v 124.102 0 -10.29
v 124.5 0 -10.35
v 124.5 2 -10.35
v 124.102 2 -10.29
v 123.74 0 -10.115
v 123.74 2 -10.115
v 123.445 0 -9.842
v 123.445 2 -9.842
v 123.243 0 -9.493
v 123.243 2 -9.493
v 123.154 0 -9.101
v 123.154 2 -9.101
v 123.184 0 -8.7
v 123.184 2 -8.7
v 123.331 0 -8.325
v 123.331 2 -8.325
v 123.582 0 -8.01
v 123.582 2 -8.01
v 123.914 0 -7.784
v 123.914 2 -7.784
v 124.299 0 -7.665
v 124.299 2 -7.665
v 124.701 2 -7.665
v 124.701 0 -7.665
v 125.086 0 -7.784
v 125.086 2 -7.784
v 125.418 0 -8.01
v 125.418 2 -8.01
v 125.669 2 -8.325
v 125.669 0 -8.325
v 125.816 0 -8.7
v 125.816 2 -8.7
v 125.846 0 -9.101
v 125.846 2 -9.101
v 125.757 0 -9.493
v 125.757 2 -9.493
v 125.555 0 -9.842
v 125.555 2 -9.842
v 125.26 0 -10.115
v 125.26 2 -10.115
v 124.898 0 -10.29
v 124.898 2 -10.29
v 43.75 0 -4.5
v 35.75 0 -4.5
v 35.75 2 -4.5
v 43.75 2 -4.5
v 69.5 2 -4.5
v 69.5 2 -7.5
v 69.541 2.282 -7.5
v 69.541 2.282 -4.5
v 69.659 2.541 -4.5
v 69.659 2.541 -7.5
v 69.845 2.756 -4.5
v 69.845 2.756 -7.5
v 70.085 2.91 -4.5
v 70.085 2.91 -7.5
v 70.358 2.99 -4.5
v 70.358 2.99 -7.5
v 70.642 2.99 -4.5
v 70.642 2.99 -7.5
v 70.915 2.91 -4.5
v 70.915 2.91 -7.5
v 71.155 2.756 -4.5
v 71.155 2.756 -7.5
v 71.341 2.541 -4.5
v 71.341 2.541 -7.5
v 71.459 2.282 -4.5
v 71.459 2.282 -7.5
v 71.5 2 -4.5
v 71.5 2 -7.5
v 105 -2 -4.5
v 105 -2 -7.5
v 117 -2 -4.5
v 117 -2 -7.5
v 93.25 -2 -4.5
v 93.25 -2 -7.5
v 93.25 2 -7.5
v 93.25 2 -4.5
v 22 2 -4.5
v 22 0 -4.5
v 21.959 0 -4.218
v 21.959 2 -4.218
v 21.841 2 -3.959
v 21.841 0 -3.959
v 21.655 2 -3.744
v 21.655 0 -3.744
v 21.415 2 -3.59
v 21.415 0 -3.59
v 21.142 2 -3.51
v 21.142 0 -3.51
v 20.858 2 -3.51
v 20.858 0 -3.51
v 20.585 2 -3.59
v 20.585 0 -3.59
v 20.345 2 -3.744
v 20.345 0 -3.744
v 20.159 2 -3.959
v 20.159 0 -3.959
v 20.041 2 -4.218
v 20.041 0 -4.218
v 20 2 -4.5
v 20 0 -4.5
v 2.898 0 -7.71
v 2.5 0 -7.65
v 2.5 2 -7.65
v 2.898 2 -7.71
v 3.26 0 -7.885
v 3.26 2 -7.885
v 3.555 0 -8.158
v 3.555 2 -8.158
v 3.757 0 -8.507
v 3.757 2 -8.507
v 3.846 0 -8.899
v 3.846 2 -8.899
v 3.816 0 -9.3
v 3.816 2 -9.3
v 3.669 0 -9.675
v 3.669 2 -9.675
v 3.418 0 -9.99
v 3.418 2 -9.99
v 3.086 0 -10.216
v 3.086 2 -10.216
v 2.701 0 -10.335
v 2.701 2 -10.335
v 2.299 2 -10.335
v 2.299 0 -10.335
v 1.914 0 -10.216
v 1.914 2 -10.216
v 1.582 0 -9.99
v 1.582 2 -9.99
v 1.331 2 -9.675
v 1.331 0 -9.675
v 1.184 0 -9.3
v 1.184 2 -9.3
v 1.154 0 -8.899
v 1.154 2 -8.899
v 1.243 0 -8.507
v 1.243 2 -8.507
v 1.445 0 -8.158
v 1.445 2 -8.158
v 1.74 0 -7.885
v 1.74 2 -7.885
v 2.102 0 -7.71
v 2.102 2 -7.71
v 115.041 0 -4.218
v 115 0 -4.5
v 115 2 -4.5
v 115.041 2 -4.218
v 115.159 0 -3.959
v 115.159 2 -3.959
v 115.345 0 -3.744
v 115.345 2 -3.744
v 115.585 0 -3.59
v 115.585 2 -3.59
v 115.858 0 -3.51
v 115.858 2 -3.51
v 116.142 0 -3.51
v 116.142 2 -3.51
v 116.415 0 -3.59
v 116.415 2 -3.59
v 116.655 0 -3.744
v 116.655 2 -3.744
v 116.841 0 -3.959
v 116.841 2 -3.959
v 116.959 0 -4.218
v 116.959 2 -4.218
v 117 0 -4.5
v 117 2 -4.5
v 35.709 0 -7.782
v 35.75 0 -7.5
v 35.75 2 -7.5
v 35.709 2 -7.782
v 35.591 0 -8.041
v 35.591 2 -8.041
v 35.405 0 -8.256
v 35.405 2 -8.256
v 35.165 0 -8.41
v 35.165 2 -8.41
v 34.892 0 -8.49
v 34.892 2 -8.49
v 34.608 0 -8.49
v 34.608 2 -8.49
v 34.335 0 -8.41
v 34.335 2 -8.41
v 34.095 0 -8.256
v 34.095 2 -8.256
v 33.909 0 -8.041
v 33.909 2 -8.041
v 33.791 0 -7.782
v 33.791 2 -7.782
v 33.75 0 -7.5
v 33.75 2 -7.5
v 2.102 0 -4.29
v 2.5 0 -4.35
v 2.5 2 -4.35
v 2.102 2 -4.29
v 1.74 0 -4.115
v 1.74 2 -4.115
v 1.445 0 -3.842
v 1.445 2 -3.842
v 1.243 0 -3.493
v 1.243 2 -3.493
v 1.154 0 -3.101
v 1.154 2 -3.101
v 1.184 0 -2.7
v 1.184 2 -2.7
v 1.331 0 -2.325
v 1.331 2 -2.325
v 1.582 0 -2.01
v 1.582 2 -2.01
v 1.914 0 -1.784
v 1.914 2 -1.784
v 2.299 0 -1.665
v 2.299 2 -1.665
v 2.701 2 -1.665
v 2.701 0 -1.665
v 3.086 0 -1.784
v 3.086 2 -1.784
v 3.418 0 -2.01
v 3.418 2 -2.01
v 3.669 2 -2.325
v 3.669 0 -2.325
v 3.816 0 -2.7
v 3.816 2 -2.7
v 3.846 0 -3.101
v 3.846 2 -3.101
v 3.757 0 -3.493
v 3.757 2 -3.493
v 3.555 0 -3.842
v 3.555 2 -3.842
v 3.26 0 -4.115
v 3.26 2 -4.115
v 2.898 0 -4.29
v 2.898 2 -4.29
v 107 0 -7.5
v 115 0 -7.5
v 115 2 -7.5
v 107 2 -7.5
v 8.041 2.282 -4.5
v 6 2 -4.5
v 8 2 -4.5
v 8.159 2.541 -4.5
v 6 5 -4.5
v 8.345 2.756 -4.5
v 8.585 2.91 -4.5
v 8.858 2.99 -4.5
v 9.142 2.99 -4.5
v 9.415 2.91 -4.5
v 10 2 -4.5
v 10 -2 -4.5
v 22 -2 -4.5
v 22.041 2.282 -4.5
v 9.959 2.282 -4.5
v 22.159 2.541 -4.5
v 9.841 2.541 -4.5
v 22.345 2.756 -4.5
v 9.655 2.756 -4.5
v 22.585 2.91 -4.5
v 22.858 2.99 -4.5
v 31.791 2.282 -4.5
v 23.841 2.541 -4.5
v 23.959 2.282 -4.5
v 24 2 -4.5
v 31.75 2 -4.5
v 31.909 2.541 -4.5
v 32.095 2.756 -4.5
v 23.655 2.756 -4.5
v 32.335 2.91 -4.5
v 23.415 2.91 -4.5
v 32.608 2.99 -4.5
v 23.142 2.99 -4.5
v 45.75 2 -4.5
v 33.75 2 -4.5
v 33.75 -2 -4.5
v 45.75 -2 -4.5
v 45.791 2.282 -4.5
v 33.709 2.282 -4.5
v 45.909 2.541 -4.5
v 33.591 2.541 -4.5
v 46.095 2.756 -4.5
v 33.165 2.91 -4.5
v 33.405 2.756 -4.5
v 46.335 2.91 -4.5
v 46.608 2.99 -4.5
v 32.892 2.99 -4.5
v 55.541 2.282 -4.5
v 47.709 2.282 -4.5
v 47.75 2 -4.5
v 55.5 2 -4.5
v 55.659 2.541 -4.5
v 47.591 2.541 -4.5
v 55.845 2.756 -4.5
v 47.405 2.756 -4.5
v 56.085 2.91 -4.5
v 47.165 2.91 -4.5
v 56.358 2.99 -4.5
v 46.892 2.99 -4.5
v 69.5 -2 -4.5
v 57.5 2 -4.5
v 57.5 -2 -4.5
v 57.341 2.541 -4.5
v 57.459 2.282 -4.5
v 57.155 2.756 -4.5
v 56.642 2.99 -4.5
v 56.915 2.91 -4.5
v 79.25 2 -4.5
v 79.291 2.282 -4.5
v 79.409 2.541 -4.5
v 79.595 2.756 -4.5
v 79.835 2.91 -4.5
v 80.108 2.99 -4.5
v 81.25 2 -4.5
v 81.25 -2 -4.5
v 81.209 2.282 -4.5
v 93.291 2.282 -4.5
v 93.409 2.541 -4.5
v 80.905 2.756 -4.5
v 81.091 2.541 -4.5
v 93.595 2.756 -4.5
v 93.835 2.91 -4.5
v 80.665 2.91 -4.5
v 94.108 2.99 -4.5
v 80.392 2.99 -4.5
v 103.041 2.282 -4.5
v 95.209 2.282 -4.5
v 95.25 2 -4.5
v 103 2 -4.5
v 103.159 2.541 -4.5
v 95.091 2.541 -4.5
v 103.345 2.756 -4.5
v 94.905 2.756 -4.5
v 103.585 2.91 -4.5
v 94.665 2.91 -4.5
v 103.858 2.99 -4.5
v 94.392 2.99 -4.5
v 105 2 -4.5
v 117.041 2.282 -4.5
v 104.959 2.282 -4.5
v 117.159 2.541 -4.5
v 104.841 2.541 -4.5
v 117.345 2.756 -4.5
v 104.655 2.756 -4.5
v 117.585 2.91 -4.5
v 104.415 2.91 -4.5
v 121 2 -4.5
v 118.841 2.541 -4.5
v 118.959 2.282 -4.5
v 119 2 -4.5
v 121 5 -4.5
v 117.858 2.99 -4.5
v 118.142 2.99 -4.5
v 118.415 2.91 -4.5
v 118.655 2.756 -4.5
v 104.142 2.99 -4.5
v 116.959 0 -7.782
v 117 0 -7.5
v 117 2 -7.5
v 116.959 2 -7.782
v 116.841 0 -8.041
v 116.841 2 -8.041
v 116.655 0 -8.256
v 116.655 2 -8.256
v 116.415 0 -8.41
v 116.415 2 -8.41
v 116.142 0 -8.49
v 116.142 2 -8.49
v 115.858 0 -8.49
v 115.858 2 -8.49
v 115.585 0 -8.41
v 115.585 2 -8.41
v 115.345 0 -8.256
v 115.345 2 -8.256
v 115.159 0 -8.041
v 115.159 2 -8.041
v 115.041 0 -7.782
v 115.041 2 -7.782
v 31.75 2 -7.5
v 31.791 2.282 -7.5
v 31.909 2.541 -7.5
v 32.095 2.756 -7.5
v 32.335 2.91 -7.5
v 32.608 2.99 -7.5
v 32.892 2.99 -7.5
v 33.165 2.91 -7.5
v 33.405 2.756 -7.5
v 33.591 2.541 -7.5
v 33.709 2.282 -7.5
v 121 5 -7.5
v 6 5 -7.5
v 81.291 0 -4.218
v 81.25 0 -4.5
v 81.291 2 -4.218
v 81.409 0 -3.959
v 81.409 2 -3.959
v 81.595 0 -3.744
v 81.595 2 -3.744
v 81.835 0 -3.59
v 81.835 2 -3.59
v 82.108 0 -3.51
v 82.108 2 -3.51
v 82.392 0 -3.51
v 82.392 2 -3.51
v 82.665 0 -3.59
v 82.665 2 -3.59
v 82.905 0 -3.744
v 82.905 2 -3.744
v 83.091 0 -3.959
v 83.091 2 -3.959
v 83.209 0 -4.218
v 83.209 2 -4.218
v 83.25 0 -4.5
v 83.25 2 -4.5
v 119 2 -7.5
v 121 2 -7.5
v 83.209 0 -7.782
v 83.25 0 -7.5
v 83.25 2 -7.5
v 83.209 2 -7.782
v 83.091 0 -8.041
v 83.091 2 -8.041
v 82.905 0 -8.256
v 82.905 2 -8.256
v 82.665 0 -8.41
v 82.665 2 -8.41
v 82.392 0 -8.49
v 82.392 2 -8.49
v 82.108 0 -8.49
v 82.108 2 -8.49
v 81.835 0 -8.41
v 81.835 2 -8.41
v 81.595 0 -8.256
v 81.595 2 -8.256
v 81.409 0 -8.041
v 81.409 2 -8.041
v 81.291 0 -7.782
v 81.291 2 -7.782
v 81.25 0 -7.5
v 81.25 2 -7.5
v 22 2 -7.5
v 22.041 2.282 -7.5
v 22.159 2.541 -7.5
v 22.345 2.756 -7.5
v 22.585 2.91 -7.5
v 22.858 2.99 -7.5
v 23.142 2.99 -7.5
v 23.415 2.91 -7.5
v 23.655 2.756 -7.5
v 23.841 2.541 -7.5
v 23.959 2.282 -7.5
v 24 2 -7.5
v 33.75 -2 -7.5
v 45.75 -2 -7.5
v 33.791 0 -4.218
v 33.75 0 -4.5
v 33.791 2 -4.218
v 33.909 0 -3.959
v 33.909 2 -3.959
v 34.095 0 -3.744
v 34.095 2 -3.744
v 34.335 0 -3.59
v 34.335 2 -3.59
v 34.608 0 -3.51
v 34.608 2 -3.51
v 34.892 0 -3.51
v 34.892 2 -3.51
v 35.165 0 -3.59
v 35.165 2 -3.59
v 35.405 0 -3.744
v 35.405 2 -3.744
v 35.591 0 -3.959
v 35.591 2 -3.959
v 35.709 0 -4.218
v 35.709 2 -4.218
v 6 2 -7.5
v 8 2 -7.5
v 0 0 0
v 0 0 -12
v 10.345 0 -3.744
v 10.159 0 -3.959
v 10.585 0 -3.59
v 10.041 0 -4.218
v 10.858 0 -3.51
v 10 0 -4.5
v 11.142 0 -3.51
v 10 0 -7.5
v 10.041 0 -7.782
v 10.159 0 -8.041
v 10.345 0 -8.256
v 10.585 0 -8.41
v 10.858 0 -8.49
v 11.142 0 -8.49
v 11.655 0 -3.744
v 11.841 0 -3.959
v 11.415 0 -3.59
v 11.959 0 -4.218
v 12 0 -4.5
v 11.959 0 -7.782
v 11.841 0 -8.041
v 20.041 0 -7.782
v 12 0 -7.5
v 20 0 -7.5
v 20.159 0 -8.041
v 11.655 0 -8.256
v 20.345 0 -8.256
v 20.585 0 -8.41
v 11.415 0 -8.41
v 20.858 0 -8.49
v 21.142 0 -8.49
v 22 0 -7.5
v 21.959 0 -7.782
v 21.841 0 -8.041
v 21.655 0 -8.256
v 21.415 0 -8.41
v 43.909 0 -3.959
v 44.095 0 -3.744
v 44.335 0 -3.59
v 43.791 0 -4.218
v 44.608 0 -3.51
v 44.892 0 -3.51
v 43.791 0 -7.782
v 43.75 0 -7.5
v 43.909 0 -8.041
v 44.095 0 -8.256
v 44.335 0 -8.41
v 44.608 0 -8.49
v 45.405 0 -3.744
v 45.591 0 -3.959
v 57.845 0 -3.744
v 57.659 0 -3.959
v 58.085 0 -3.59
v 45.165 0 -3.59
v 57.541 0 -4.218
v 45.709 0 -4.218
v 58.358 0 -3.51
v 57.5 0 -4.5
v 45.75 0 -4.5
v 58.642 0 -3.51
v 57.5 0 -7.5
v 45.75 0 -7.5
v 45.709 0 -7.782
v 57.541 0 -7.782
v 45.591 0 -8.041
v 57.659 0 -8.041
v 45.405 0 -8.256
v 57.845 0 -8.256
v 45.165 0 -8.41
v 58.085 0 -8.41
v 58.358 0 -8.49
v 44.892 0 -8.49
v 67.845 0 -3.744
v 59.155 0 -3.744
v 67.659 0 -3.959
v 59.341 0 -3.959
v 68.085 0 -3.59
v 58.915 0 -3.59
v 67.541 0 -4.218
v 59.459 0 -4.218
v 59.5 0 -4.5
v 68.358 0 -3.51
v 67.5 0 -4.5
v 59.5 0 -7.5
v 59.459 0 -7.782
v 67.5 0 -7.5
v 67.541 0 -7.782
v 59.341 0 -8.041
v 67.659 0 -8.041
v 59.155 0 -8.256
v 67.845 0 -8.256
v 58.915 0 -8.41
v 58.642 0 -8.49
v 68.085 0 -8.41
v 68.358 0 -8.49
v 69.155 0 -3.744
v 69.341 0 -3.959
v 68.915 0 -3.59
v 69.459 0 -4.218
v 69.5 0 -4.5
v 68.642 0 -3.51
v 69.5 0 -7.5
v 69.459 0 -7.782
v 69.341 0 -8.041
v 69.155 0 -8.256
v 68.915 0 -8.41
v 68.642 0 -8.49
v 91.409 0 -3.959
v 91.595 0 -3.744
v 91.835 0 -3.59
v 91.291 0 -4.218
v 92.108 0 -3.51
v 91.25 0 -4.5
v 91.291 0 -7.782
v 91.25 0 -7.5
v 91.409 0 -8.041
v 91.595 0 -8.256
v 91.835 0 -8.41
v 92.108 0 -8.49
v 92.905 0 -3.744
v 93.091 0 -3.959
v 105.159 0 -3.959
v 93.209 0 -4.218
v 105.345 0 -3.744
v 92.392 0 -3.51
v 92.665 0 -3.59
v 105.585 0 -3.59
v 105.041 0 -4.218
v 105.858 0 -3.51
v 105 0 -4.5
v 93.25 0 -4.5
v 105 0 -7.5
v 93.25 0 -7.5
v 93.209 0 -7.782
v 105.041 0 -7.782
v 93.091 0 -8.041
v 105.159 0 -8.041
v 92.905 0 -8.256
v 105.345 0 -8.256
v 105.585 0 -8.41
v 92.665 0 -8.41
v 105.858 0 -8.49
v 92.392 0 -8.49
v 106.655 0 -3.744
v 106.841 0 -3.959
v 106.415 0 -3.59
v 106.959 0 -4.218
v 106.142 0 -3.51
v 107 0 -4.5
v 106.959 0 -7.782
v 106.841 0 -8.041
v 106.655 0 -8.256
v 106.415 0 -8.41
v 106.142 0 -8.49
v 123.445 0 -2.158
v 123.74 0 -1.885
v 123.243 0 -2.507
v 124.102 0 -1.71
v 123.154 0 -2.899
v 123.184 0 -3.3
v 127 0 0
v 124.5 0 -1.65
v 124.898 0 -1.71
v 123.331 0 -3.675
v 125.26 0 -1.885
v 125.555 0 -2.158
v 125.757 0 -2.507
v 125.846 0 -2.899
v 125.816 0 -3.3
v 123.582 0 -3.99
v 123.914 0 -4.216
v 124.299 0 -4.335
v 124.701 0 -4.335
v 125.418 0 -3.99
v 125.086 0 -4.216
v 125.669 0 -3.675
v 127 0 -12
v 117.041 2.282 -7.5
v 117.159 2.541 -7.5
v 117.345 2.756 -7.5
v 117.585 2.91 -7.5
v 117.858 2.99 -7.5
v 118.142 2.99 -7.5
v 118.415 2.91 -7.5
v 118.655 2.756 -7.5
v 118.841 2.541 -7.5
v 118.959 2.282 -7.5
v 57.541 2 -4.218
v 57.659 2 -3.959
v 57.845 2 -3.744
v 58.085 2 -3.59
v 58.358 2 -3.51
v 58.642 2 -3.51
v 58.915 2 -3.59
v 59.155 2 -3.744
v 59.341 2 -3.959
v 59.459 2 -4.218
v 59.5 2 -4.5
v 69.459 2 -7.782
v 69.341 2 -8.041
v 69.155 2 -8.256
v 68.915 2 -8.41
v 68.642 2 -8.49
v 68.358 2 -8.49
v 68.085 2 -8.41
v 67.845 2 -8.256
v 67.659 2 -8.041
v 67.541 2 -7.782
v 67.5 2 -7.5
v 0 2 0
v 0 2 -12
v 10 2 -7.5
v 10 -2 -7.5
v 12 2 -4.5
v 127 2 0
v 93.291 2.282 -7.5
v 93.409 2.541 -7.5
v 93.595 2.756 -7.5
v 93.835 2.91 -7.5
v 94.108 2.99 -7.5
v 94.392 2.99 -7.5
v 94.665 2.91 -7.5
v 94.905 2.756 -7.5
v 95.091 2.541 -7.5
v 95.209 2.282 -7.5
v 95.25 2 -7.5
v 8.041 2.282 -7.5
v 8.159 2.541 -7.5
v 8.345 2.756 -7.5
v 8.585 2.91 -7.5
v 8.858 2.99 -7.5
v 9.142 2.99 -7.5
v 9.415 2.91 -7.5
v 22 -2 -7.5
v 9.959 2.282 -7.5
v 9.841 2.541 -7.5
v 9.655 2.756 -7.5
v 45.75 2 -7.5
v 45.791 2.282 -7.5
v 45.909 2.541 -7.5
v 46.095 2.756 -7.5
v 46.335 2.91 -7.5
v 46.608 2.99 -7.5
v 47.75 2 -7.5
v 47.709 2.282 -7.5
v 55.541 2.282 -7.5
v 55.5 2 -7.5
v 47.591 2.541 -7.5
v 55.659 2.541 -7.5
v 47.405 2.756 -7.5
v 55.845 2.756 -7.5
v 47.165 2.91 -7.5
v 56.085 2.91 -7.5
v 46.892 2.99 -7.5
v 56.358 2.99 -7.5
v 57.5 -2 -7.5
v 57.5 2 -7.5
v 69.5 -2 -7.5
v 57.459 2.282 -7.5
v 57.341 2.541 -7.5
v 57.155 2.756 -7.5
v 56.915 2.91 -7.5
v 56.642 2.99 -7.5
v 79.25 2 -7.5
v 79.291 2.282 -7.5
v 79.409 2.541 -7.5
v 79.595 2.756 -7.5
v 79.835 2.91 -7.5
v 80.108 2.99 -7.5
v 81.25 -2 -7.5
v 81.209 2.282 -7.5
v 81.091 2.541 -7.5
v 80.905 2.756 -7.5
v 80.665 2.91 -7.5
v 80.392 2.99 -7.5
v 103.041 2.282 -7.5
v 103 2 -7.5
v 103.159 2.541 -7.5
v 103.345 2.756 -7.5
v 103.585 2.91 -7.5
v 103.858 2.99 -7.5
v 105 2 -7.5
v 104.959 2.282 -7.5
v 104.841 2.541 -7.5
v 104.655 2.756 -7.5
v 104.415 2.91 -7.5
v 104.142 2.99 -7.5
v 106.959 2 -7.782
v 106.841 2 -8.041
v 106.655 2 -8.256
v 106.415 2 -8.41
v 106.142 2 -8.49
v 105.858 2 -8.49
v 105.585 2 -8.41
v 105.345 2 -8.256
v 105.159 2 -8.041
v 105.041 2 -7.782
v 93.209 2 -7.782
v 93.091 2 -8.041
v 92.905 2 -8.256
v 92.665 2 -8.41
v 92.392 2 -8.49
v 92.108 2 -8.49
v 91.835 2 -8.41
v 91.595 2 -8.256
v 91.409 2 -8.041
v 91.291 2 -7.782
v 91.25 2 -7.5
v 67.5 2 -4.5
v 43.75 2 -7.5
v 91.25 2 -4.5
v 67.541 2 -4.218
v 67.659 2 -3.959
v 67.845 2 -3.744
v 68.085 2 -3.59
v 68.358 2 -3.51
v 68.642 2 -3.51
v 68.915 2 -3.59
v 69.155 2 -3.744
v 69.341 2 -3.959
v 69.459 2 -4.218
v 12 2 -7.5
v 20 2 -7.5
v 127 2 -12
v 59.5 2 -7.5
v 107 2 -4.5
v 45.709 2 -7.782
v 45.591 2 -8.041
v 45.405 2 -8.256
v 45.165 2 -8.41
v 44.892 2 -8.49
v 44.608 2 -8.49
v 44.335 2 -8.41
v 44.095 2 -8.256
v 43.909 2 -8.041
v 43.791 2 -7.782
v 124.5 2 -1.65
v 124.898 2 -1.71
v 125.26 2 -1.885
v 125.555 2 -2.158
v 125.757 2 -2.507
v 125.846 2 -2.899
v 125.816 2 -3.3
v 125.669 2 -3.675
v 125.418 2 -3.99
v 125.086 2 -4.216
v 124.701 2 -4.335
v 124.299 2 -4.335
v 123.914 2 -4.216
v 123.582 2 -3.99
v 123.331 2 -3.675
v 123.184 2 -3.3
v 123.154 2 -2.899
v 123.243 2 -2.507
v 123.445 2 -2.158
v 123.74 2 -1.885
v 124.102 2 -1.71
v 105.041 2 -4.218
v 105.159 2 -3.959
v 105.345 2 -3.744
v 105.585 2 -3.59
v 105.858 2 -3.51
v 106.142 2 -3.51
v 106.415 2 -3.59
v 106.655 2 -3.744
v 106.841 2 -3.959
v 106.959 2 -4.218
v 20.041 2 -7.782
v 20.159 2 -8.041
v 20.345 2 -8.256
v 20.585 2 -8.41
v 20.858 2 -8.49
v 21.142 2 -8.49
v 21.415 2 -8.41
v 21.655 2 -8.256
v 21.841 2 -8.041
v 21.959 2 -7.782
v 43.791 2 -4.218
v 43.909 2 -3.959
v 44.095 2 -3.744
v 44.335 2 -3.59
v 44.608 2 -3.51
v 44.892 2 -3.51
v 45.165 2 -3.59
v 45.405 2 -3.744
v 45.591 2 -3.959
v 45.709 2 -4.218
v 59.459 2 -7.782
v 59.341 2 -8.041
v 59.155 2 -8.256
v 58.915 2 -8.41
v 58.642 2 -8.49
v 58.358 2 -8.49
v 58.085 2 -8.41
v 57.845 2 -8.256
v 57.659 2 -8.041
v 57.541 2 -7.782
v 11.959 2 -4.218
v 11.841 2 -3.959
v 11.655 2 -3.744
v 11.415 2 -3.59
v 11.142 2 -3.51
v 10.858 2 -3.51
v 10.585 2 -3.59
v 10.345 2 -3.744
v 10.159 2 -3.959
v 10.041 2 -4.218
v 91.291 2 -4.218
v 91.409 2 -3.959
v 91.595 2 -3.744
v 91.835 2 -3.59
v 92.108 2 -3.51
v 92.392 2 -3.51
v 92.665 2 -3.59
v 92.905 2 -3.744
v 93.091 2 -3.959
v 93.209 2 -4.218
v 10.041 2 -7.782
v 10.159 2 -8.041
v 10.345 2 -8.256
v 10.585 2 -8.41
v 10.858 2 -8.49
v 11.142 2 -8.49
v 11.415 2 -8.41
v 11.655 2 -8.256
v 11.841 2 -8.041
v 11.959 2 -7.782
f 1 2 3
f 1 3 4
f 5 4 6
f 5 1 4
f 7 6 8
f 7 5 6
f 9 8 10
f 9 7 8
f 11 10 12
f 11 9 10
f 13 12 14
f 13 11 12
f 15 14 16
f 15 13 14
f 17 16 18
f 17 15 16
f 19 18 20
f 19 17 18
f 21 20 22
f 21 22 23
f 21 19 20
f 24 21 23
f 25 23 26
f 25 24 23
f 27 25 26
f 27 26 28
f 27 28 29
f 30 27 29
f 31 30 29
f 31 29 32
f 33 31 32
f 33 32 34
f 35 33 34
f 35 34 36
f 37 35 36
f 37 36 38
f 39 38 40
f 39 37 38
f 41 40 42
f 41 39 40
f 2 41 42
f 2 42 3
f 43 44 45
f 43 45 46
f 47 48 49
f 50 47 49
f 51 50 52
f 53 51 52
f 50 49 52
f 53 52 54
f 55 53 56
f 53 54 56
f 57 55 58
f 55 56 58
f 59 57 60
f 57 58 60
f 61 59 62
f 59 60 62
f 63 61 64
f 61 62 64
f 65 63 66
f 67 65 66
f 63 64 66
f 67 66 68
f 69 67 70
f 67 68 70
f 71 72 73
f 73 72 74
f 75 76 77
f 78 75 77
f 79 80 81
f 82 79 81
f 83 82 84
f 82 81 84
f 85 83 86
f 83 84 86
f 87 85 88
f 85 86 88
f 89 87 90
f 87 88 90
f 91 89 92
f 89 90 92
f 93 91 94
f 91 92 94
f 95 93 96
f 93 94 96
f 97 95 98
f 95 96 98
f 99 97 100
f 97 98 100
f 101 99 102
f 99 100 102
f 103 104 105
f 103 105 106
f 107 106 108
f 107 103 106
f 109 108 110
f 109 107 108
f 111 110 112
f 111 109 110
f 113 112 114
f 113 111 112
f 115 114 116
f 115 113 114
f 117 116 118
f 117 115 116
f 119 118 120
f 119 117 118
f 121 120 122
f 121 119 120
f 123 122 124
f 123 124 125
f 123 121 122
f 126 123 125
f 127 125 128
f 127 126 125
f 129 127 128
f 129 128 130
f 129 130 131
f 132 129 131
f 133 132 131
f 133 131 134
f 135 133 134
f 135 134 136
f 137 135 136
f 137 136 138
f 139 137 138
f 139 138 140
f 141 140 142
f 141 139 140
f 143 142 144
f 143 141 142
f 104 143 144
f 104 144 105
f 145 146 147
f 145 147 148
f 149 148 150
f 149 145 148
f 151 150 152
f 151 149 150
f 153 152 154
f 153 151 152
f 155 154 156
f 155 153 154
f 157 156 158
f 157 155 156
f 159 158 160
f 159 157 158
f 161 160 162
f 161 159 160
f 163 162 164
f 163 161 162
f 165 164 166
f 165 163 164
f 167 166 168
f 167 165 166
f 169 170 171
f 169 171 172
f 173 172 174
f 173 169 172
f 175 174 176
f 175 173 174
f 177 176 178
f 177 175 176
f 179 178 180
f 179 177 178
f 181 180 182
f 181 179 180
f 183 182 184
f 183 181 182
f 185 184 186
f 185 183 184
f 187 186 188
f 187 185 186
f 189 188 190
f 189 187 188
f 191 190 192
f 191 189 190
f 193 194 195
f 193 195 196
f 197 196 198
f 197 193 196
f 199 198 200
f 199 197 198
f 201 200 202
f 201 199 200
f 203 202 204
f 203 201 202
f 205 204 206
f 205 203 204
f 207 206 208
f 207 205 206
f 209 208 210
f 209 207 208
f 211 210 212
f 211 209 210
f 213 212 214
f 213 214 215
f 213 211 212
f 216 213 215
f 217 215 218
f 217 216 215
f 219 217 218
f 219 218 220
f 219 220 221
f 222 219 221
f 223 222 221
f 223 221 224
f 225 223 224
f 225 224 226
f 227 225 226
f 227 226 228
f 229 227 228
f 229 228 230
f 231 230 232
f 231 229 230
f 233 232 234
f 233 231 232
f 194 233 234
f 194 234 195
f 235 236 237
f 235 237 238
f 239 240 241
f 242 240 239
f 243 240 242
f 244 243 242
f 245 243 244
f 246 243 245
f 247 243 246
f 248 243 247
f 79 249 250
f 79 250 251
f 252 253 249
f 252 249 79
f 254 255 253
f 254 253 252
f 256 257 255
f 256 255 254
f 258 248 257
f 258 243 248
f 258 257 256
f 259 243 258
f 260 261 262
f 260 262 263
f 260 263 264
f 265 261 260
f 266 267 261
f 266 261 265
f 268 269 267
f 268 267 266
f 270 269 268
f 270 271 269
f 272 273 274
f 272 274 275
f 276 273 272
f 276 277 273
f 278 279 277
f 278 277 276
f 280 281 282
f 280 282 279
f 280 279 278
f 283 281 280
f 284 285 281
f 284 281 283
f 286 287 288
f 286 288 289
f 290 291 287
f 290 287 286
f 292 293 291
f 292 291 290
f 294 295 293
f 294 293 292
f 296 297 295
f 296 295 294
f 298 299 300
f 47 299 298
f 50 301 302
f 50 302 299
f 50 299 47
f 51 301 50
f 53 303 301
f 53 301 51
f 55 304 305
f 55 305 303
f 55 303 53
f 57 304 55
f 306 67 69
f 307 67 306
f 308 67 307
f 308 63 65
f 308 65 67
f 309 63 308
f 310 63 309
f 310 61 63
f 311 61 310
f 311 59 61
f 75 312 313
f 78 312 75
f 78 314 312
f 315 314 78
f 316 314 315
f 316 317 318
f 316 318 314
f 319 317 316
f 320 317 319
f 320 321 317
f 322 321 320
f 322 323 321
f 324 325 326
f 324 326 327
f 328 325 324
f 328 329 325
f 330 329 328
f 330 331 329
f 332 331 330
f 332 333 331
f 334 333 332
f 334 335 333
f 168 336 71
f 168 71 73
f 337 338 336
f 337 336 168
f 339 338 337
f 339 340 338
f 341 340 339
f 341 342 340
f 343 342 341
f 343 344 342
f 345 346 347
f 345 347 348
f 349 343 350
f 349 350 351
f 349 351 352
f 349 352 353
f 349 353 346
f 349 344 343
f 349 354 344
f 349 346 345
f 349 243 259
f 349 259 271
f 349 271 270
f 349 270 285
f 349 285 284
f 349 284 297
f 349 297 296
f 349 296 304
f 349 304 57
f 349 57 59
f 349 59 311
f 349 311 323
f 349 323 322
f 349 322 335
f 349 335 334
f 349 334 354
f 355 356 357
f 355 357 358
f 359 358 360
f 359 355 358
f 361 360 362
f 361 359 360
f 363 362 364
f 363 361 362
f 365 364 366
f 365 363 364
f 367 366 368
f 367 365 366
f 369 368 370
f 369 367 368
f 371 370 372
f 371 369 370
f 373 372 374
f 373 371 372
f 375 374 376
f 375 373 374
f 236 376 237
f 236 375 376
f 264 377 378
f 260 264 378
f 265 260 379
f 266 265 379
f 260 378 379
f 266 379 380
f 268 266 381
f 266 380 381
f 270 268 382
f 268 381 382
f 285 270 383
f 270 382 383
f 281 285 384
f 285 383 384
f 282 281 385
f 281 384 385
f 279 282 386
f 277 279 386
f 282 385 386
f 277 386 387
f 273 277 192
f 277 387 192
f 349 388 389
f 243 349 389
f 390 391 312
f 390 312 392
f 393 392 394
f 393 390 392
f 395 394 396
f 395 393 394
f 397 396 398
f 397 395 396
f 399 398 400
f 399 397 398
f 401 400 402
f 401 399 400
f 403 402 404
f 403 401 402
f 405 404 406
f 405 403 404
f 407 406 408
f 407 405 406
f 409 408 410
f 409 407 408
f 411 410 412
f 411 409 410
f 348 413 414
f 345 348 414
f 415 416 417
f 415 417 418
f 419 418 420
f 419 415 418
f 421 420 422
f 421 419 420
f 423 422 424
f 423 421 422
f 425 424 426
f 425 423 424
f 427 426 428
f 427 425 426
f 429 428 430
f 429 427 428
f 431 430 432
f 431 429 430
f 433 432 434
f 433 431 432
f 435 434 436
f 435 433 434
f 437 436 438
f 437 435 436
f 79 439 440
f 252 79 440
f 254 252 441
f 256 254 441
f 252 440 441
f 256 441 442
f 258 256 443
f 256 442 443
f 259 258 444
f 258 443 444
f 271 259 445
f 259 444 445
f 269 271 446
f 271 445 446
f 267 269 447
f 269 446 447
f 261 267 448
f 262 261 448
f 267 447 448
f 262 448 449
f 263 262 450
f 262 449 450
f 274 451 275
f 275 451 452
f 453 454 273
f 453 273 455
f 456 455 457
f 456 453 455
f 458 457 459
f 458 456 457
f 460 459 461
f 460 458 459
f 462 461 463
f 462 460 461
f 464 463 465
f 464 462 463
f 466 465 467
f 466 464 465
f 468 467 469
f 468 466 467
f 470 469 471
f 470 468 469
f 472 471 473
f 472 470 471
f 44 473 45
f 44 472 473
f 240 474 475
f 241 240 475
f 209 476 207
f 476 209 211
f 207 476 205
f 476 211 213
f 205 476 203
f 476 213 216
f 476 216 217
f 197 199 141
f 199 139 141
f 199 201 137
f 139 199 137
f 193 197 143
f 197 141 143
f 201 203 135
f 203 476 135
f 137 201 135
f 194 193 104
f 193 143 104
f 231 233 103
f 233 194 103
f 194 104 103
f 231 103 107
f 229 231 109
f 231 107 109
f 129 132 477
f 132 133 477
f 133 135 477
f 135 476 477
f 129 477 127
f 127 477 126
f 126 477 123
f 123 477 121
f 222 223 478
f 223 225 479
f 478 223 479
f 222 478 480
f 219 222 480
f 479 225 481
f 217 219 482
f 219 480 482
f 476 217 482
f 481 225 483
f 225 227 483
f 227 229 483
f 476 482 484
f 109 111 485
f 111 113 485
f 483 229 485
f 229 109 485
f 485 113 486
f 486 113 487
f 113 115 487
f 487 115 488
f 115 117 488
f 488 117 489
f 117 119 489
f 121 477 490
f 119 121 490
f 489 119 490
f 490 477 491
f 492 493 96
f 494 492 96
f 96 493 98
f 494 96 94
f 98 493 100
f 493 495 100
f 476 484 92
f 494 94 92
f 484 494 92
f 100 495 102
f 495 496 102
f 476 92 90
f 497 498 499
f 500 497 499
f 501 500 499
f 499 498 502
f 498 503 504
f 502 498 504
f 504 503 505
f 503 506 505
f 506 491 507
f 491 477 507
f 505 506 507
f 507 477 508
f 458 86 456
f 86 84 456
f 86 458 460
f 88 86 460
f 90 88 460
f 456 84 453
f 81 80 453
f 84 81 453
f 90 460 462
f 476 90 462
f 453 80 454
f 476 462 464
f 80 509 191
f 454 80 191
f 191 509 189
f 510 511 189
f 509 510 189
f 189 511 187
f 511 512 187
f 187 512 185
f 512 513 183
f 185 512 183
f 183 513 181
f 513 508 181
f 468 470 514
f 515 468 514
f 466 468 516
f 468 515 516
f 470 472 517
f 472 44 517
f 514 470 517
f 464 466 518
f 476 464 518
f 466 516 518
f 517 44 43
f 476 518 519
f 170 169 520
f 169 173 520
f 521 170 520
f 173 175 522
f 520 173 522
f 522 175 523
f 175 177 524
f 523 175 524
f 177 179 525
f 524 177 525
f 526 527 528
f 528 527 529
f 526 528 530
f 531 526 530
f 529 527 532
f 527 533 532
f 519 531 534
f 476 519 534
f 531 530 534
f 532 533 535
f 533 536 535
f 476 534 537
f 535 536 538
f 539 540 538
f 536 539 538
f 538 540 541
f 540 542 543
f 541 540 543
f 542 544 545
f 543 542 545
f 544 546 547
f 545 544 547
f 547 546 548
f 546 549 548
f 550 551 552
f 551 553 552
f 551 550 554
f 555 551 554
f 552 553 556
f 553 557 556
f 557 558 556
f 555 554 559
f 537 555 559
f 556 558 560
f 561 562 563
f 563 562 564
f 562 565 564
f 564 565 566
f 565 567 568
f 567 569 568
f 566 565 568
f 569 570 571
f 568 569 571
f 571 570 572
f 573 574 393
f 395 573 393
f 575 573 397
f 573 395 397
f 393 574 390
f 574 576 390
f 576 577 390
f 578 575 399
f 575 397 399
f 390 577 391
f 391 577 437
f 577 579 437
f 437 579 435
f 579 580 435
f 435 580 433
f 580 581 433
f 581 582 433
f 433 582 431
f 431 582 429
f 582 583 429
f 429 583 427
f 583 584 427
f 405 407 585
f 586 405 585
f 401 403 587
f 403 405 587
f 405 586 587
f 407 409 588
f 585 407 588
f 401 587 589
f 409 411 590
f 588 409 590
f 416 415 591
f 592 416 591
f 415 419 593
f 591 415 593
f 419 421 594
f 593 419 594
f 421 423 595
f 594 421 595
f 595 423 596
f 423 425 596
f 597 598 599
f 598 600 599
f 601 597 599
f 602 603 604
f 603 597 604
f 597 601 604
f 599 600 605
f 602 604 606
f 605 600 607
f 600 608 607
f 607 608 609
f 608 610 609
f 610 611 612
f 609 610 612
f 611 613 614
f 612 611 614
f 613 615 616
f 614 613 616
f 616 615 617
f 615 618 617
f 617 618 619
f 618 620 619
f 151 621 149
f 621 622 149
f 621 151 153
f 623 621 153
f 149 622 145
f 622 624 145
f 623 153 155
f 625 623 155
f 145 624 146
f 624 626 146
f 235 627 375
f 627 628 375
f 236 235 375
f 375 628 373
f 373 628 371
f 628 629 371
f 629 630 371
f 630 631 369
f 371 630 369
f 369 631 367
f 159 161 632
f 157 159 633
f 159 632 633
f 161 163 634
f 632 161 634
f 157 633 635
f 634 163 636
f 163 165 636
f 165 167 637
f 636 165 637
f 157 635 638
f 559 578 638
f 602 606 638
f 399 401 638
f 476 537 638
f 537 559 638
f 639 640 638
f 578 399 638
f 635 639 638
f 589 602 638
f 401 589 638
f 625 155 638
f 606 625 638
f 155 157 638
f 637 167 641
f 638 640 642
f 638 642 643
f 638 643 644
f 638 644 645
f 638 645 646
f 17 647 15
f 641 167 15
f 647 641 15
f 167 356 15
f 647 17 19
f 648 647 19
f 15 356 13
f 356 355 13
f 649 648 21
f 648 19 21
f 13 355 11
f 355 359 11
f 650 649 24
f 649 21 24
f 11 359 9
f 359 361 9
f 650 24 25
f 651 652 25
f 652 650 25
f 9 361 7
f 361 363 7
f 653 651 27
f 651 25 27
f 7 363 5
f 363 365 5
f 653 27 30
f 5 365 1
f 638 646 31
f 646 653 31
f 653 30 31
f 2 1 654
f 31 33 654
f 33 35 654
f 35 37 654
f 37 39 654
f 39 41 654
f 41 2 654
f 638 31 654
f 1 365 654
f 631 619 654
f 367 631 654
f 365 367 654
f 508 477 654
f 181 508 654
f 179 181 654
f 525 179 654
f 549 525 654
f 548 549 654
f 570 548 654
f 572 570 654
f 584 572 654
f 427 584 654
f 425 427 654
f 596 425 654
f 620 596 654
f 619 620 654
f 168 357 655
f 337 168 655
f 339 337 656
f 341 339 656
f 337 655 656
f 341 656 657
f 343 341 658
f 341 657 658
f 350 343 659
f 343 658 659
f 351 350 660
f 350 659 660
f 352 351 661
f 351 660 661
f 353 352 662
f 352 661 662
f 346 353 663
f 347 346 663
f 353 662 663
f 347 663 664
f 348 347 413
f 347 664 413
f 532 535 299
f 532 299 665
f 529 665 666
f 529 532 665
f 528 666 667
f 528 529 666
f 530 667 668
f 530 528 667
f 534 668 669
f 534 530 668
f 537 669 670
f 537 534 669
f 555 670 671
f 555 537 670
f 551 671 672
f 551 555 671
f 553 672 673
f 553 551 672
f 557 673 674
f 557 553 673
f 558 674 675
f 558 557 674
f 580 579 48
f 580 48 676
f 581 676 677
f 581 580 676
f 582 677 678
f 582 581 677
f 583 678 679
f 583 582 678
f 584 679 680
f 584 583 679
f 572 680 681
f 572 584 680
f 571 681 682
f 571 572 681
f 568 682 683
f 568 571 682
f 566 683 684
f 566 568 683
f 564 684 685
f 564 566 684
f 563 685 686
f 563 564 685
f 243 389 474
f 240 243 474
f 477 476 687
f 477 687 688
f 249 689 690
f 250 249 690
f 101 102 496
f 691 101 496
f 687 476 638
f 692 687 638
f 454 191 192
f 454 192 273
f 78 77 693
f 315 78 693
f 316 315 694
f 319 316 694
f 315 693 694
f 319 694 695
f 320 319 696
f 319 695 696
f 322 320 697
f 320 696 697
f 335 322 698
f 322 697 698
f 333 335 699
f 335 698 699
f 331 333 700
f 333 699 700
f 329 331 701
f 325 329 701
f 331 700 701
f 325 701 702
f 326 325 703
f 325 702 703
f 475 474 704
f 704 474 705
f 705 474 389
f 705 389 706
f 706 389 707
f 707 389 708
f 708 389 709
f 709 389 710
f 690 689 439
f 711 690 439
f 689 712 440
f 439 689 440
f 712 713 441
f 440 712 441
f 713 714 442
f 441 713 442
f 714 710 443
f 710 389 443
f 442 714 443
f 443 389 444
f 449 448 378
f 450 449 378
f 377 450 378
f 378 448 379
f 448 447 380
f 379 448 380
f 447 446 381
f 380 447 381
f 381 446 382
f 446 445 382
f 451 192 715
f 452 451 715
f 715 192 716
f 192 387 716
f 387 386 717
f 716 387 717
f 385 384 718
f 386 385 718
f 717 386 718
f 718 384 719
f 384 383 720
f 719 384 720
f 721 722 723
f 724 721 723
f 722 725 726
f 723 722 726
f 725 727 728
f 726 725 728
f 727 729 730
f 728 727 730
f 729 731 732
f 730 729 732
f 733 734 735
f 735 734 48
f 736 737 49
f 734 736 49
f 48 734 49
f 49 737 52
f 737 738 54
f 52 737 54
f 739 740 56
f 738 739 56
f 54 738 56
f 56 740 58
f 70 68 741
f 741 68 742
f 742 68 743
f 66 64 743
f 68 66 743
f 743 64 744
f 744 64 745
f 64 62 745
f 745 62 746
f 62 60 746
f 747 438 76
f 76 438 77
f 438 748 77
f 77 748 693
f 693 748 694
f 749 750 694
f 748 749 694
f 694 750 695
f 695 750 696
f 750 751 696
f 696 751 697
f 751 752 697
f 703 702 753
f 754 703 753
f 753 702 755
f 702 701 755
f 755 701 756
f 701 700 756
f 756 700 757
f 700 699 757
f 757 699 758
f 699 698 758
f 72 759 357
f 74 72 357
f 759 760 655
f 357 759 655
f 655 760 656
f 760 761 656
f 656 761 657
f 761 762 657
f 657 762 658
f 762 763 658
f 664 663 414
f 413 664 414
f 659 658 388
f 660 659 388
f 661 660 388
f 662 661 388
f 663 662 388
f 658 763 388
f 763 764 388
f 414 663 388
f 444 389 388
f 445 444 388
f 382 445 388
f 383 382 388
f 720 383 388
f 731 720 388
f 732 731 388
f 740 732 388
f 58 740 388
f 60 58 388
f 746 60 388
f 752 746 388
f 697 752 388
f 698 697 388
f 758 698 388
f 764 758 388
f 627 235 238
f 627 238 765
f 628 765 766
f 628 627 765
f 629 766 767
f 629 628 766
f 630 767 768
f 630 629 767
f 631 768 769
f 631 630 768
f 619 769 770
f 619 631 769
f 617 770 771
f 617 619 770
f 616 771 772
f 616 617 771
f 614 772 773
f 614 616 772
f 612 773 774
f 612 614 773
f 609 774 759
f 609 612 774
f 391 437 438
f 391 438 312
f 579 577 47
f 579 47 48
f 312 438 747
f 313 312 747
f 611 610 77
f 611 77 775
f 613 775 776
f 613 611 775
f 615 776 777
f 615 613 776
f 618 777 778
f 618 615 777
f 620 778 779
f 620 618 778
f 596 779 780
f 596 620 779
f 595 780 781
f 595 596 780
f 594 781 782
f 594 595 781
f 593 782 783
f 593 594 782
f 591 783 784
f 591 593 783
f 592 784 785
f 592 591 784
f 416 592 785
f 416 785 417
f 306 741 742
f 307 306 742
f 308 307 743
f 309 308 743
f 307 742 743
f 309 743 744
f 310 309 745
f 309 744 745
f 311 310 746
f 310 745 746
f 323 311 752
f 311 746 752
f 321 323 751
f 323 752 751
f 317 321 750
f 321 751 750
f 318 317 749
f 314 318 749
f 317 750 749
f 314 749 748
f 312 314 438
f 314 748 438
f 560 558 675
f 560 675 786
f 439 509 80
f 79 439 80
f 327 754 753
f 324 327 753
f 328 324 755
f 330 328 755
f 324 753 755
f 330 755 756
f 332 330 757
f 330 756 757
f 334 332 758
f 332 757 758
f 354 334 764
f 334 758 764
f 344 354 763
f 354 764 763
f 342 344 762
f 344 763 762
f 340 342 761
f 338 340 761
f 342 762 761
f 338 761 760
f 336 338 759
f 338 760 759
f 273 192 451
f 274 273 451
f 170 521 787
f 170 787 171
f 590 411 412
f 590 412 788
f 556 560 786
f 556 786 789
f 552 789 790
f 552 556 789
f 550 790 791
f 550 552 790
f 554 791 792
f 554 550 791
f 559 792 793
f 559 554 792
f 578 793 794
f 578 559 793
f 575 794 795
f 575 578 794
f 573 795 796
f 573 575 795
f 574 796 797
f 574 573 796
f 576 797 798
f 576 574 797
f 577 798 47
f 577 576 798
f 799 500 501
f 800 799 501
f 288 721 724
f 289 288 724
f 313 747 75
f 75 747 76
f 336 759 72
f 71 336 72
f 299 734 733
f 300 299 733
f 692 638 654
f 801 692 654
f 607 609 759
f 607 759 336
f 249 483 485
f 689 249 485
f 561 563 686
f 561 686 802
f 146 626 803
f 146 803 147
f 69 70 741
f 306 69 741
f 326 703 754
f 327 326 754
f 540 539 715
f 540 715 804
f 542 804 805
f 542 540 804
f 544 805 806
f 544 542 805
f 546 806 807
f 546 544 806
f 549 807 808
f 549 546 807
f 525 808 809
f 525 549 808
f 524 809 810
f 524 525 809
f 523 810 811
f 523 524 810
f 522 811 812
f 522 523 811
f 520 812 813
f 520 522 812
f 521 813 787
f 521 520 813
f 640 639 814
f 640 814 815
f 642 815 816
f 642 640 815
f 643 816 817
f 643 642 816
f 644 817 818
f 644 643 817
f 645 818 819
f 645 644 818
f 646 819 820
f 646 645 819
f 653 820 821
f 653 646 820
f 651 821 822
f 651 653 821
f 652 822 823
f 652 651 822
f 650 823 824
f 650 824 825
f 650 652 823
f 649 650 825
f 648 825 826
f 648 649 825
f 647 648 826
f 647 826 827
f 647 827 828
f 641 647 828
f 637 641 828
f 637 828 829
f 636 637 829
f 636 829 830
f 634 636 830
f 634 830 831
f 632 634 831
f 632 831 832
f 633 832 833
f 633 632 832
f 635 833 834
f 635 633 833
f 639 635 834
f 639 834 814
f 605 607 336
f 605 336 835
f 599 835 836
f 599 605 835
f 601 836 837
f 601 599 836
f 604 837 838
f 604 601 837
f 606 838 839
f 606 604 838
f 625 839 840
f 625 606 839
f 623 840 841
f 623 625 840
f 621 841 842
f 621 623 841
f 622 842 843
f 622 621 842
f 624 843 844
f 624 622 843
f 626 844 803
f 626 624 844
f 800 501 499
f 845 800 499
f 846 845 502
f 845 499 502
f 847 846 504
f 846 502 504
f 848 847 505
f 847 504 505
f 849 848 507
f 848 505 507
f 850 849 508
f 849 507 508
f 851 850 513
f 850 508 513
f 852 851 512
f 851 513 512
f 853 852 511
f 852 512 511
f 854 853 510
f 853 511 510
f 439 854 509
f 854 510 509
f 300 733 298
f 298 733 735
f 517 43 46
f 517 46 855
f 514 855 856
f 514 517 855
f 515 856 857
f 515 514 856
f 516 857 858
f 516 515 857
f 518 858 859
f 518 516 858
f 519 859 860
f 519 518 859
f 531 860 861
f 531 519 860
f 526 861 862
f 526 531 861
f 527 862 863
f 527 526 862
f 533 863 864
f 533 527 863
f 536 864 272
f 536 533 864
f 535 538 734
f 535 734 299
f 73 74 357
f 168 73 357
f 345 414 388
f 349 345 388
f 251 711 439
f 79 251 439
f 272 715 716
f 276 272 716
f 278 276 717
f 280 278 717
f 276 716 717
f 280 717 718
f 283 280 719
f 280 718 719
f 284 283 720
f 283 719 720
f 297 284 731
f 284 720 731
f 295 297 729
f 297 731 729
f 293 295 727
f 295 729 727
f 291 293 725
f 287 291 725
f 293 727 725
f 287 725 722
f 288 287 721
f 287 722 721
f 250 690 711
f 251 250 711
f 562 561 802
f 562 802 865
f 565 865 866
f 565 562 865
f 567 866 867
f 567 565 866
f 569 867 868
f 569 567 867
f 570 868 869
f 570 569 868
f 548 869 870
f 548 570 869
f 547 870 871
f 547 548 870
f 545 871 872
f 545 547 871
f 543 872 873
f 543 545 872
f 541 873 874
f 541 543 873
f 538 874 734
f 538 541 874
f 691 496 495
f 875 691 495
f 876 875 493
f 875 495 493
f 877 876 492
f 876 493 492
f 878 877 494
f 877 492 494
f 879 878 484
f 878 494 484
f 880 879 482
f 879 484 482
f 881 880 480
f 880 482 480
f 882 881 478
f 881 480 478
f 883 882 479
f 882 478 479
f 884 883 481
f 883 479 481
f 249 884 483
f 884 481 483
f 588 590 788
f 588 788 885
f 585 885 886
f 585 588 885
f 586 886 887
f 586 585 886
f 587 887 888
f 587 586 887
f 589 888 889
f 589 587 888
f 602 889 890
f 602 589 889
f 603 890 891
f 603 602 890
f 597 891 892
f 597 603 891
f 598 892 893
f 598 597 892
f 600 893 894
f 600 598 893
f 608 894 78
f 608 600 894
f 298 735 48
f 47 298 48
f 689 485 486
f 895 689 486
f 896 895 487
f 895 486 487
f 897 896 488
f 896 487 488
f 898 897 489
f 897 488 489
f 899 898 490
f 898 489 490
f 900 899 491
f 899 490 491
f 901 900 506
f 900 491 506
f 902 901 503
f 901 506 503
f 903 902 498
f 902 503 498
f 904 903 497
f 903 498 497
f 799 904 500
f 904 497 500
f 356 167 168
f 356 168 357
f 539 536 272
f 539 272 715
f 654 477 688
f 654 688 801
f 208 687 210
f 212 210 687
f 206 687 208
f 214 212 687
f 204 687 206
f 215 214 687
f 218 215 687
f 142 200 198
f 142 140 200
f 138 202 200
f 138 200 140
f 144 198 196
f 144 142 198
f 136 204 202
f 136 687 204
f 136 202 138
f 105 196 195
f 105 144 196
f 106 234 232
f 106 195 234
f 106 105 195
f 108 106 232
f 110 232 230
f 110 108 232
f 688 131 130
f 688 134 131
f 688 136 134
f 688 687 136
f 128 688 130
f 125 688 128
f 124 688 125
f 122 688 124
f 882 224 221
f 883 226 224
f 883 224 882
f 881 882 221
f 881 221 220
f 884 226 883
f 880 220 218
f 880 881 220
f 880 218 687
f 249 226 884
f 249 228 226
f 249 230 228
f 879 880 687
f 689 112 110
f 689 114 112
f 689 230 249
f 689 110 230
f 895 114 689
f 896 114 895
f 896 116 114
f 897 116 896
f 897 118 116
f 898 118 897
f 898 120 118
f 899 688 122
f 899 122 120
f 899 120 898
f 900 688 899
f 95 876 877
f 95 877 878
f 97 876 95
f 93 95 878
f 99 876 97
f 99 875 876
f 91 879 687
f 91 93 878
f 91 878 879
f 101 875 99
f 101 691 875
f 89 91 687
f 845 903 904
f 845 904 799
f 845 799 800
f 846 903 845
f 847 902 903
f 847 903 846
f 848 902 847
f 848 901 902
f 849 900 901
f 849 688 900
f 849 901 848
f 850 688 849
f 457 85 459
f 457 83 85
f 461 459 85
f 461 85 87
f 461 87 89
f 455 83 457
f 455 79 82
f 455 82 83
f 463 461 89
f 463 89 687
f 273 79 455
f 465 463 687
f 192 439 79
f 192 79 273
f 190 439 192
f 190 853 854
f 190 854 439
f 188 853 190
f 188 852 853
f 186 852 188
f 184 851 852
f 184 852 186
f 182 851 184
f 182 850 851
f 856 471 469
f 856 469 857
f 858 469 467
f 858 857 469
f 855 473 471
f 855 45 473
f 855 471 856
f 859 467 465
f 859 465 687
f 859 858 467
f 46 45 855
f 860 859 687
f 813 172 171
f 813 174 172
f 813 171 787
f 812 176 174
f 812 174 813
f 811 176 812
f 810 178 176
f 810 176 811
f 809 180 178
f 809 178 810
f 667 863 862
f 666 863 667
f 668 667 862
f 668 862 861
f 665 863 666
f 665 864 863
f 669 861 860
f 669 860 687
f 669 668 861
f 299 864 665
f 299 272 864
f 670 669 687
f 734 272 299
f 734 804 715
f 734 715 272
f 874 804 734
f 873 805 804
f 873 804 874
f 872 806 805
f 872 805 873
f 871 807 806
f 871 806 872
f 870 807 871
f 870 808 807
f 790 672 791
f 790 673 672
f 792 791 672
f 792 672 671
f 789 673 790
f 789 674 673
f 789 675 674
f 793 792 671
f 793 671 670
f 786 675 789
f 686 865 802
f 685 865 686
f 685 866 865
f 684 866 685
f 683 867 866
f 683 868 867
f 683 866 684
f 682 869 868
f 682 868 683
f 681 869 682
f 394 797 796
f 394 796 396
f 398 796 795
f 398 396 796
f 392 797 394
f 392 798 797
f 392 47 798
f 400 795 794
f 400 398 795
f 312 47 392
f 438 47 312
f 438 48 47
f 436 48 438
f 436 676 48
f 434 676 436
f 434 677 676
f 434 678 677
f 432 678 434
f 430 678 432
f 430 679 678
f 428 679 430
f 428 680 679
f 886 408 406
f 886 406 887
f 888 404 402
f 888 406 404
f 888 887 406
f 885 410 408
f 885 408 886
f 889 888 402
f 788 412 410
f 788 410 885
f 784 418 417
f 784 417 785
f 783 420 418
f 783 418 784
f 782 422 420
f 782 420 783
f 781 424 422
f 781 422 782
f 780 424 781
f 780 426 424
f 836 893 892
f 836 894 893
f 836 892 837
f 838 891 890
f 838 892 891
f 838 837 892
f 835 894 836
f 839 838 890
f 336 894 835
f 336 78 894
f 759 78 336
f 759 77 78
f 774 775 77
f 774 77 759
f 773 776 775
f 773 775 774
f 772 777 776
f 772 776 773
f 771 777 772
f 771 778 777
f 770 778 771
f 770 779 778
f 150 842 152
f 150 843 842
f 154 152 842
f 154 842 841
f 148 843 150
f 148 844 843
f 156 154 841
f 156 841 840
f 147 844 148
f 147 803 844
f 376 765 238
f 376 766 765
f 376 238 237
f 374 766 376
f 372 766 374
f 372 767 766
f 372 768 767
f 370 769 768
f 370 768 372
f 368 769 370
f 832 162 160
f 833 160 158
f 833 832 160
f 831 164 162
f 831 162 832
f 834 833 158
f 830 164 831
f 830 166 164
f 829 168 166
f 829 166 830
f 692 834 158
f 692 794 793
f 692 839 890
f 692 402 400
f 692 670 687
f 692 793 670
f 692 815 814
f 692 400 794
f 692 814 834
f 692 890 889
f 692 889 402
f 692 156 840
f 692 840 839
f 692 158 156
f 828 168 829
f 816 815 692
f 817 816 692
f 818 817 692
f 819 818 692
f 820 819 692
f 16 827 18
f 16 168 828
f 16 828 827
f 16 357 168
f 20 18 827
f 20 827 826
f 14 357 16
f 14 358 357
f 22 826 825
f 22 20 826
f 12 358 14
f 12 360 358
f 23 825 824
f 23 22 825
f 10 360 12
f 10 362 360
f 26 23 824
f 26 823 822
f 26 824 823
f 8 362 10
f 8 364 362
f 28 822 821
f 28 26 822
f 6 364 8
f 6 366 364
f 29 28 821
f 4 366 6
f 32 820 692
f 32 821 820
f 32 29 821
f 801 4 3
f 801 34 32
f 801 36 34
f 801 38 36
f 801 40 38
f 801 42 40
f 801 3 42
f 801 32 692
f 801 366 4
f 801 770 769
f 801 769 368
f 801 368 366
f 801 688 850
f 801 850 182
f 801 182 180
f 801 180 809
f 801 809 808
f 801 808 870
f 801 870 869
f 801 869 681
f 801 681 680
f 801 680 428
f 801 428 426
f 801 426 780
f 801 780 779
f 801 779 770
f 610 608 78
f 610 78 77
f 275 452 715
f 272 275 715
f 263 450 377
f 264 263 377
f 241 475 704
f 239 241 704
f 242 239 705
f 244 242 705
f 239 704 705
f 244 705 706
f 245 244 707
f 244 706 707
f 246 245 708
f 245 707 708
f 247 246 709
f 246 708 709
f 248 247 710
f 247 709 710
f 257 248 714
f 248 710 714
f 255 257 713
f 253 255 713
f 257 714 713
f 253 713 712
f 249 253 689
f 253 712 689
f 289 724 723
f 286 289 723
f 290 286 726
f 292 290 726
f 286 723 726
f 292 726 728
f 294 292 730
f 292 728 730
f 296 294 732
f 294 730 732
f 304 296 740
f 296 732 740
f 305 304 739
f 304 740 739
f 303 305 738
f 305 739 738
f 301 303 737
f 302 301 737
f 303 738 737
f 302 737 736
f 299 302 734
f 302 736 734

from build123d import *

# Parameters (mm, degrees)
SKETCH_1_W      = 127
SKETCH_1_H      = 12
SKETCH_1_R      = 1.35
EXTRUDE_1_DEPTH = 2
EXTRUDE_2_DEPTH = 3


with BuildPart() as part:
    # 草图1 → 凸台-拉伸1 (new body)
    with BuildSketch(Plane(origin=(0, 0, 0), x_dir=(1, 0, 0), z_dir=(0, 1, 0))):
        with Locations((63.5, 6)):
            Rectangle(SKETCH_1_W, SKETCH_1_H)
        with Locations(Location((2.5, 9, 0), (0, 0, 270))):
            Circle(SKETCH_1_R, mode=Mode.SUBTRACT)
        with Locations(Location((2.5, 3, 0), (0, 0, 90))):
            Circle(SKETCH_1_R, mode=Mode.SUBTRACT)
        with Locations(Location((124.5, 3, 0), (0, 0, 270))):
            Circle(SKETCH_1_R, mode=Mode.SUBTRACT)
        with Locations(Location((124.5, 9, 0), (0, 0, 90))):
            Circle(SKETCH_1_R, mode=Mode.SUBTRACT)
        with BuildLine():
            Line((12, 7.5), (20, 7.5))
            ThreePointArc((20, 7.5), (21, 8.5), (22, 7.5))
            Line((22, 7.5), (22, 4.5))
            ThreePointArc((22, 4.5), (21, 3.5), (20, 4.5))
            Line((20, 4.5), (12, 4.5))
            ThreePointArc((12, 4.5), (11, 3.5), (10, 4.5))
            Line((10, 4.5), (10, 7.5))
            ThreePointArc((10, 7.5), (11, 8.5), (12, 7.5))
        make_face(mode=Mode.SUBTRACT)
        with BuildLine():
            Line((35.75, 4.5), (43.75, 4.5))
            ThreePointArc((43.75, 4.5), (44.75, 3.5), (45.75, 4.5))
            Line((45.75, 4.5), (45.75, 7.5))
            ThreePointArc((45.75, 7.5), (44.75, 8.5), (43.75, 7.5))
            Line((43.75, 7.5), (35.75, 7.5))
            ThreePointArc((35.75, 7.5), (34.75, 8.5), (33.75, 7.5))
            Line((33.75, 7.5), (33.75, 4.5))
            ThreePointArc((33.75, 4.5), (34.75, 3.5), (35.75, 4.5))
        make_face(mode=Mode.SUBTRACT)
        with BuildLine():
            Line((59.5, 4.5), (67.5, 4.5))
            ThreePointArc((67.5, 4.5), (68.5, 3.5), (69.5, 4.5))
            Line((69.5, 4.5), (69.5, 7.5))
            ThreePointArc((69.5, 7.5), (68.5, 8.5), (67.5, 7.5))
            Line((67.5, 7.5), (59.5, 7.5))
            ThreePointArc((59.5, 7.5), (58.5, 8.5), (57.5, 7.5))
            Line((57.5, 7.5), (57.5, 4.5))
            ThreePointArc((57.5, 4.5), (58.5, 3.5), (59.5, 4.5))
        make_face(mode=Mode.SUBTRACT)
        with BuildLine():
            Line((83.25, 4.5), (91.25, 4.5))
            ThreePointArc((91.25, 4.5), (92.25, 3.5), (93.25, 4.5))
            Line((93.25, 4.5), (93.25, 7.5))
            ThreePointArc((93.25, 7.5), (92.25, 8.5), (91.25, 7.5))
            Line((91.25, 7.5), (83.25, 7.5))
            ThreePointArc((83.25, 7.5), (82.25, 8.5), (81.25, 7.5))
            Line((81.25, 7.5), (81.25, 4.5))
            ThreePointArc((81.25, 4.5), (82.25, 3.5), (83.25, 4.5))
        make_face(mode=Mode.SUBTRACT)
        with BuildLine():
            Line((107, 4.5), (115, 4.5))
            ThreePointArc((115, 4.5), (116, 3.5), (117, 4.5))
            Line((117, 4.5), (117, 7.5))
            ThreePointArc((117, 7.5), (116, 8.5), (115, 7.5))
            Line((115, 7.5), (107, 7.5))
            ThreePointArc((107, 7.5), (106, 8.5), (105, 7.5))
            Line((105, 7.5), (105, 4.5))
            ThreePointArc((105, 4.5), (106, 3.5), (107, 4.5))
        make_face(mode=Mode.SUBTRACT)
    extrude(amount=EXTRUDE_1_DEPTH)


with BuildPart() as body_2:
    # 草图2 → 凸台-拉伸2 (new body)
    with BuildSketch(Plane.XY.offset(-7.5)):
        with BuildLine():
            Line((22, 0), (22, 2))
            ThreePointArc((22, 2), (23, 3), (24, 2))
            Line((24, 2), (31.75, 2))
            ThreePointArc((31.75, 2), (32.75, 3), (33.75, 2))
            Line((33.75, 2), (33.75, 0))
            Line((33.75, 0), (33.75, -2))
            Line((33.75, -2), (45.75, -2))
            Line((45.75, -2), (45.75, 0))
            Line((45.75, 0), (45.75, 2))
            ThreePointArc((45.75, 2), (46.75, 3), (47.75, 2))
            Line((47.75, 2), (55.5, 2))
            ThreePointArc((55.5, 2), (56.5, 3), (57.5, 2))
            Line((57.5, 2), (57.5, 0))
            Line((57.5, 0), (57.5, -2))
            Line((57.5, -2), (69.5, -2))
            Line((69.5, -2), (69.5, 0))
            Line((69.5, 0), (69.5, 2))
            ThreePointArc((69.5, 2), (70.5, 3), (71.5, 2))
            Line((71.5, 2), (79.25, 2))
            ThreePointArc((79.25, 2), (80.25, 3), (81.25, 2))
            Line((81.25, 2), (81.25, 0))
            Line((81.25, 0), (81.25, -2))
            Line((81.25, -2), (93.25, -2))
            Line((93.25, -2), (93.25, 0))
            Line((93.25, 0), (93.25, 2))
            ThreePointArc((93.25, 2), (94.25, 3), (95.25, 2))
            Line((95.25, 2), (103, 2))
            ThreePointArc((103, 2), (104, 3), (105, 2))
            Line((105, 2), (105, 0))
            Line((105, 0), (105, -2))
            Line((105, -2), (117, -2))
            Line((117, -2), (117, 0))
            Line((117, 0), (117, 2))
            ThreePointArc((117, 2), (118, 3), (119, 2))
            Line((119, 2), (121, 2))
            Line((121, 2), (121, 5))
            Line((121, 5), (6, 5))
            Line((6, 5), (6, 2))
            Line((6, 2), (8, 2))
            ThreePointArc((8, 2), (9, 3), (10, 2))
            Line((10, 2), (10, 0))
            Line((10, 0), (10, -2))
            Line((10, -2), (22, -2))
            Line((22, -2), (22, 0))
        make_face()
    extrude(amount=EXTRUDE_2_DEPTH)


solid = Compound([part.part, body_2.part])
